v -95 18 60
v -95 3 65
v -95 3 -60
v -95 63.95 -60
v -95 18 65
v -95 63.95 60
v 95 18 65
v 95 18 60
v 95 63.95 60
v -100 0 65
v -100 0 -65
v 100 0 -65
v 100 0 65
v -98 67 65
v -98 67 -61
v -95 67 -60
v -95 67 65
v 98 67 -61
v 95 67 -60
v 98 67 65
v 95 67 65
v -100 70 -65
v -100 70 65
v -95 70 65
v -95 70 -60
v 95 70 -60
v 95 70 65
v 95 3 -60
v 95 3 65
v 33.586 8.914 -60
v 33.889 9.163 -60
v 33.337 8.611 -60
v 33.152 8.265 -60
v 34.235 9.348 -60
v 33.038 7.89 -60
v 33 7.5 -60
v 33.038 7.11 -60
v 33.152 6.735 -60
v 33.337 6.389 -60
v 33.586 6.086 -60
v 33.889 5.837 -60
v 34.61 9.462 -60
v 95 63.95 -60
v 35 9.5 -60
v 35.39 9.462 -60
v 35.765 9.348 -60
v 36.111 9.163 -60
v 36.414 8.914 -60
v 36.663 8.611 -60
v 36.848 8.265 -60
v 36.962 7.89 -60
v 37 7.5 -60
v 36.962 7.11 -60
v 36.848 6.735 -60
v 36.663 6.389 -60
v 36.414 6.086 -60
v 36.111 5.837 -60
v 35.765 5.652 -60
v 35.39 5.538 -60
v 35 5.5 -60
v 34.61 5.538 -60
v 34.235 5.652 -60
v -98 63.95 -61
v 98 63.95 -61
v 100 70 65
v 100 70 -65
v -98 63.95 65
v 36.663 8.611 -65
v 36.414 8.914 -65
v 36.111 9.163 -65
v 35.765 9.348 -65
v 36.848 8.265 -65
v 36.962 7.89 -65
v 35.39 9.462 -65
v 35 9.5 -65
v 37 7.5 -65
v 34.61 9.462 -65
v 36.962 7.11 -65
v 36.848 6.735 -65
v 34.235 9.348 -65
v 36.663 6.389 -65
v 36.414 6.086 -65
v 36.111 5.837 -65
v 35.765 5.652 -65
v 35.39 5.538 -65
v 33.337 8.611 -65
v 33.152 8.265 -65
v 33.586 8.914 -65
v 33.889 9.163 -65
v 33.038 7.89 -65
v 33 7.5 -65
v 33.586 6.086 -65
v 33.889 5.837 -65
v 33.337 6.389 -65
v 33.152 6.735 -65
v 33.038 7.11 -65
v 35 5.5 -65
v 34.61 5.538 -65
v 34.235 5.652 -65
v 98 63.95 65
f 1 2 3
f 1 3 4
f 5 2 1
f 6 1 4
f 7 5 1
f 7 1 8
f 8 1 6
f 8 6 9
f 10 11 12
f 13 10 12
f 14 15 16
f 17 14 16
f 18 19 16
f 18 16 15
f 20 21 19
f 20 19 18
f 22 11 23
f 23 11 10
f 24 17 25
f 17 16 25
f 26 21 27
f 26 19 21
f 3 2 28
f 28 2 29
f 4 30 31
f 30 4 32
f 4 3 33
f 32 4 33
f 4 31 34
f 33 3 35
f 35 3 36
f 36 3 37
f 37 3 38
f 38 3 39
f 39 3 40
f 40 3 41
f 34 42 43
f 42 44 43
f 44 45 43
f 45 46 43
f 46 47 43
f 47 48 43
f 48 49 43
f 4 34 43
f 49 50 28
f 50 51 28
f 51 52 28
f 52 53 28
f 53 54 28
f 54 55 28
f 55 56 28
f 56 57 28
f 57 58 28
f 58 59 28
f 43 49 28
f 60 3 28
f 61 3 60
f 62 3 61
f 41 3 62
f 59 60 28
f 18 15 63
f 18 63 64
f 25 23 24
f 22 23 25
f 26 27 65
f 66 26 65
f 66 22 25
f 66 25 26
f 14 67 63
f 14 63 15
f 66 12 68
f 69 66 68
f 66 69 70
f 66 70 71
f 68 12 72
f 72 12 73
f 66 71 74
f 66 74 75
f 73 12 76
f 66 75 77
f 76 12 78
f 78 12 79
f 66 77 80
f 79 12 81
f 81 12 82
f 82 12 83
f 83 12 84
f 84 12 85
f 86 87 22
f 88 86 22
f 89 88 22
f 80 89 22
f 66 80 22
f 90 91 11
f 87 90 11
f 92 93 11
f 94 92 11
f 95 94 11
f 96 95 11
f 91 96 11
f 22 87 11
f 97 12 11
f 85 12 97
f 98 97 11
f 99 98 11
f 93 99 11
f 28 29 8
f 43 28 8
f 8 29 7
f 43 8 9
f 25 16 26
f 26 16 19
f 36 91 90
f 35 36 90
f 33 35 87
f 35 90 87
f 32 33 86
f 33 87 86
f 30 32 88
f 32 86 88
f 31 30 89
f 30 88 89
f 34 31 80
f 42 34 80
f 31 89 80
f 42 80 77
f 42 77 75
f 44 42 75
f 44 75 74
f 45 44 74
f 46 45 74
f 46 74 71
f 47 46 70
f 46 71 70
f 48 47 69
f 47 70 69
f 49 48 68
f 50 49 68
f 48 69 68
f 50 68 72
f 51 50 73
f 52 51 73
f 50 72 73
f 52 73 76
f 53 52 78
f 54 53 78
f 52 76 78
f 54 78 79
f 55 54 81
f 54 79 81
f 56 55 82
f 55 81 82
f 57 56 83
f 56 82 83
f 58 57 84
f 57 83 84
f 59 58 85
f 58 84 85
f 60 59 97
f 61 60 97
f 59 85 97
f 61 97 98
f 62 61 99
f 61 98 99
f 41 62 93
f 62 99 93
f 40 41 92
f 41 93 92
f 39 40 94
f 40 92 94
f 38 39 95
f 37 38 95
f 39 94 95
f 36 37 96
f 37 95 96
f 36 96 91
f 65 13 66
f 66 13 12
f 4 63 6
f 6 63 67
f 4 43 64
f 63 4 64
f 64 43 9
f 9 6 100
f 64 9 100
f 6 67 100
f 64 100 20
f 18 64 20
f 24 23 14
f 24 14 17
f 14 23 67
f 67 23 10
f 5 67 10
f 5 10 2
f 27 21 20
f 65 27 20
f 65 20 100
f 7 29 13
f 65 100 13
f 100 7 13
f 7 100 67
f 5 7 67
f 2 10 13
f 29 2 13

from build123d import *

# Parameters (mm, degrees)
CROQUIS1_W              = 200
CROQUIS1_H              = 130
SALIENTE_EXTRUIR1_DEPTH = 3
CROQUIS2_W              = 5
CROQUIS2_H              = 5
CROQUIS2_H_2            = 120
CROQUIS2_W_2            = 190
SALIENTE_EXTRUIR2_DEPTH = 67
CROQUIS3_W              = 190
CROQUIS3_H              = 15
CORTAR_EXTRUIR1_DEPTH   = 5
CROQUIS4_W              = 196
CROQUIS4_H              = 3.05
CORTAR_EXTRUIR2_DEPTH   = 126
CROQUIS7_W              = 190
CROQUIS7_H              = 3
CORTAR_EXTRUIR3_DEPTH   = 5
CROQUIS8_R              = 2
CORTAR_EXTRUIR4_DEPTH   = 5


with BuildPart() as part:
    # Croquis1 → Saliente-Extruir1 (new body)
    with BuildSketch(Plane(origin=(0, 0, 0), x_dir=(1, 0, 0), z_dir=(0, 1, 0))):
        Rectangle(CROQUIS1_W, CROQUIS1_H)
    extrude(amount=SALIENTE_EXTRUIR1_DEPTH)

    # Croquis2 → Saliente-Extruir2 (add)
    with BuildSketch(Plane(origin=(0, 3, 0), x_dir=(1, 0, 0), z_dir=(0, 1, 0))):
        with Locations((-97.5, 62.5)):
            Rectangle(CROQUIS2_W, CROQUIS2_H)
        with Locations((-97.5, 0)):
            Rectangle(CROQUIS2_W, CROQUIS2_H_2)
        with Locations((0, 62.5)):
            Rectangle(CROQUIS2_W_2, CROQUIS2_H)
        with Locations((97.5, 62.5)):
            Rectangle(CROQUIS2_W, CROQUIS2_H)
        with Locations((-97.5, -62.5)):
            Rectangle(CROQUIS2_W, CROQUIS2_H)
        with Locations((97.5, 0)):
            Rectangle(CROQUIS2_W, CROQUIS2_H_2)
        with Locations((0, -62.5)):
            Rectangle(CROQUIS2_W_2, CROQUIS2_H)
        with Locations((97.5, -62.5)):
            Rectangle(CROQUIS2_W, CROQUIS2_H)
    extrude(amount=SALIENTE_EXTRUIR2_DEPTH)

    # Croquis3 → Cortar-Extruir1 (cut)
    with BuildSketch(Plane.XY.offset(65)):
        with Locations((0, 10.5)):
            Rectangle(CROQUIS3_W, CROQUIS3_H)
    extrude(amount=-CORTAR_EXTRUIR1_DEPTH, mode=Mode.SUBTRACT)

    # Croquis4 → Cortar-Extruir2 (cut)
    with BuildSketch(Plane.XY.offset(65)):
        with Locations((0, 65.475)):
            Rectangle(CROQUIS4_W, CROQUIS4_H)
    extrude(amount=-CORTAR_EXTRUIR2_DEPTH, mode=Mode.SUBTRACT)

    # Croquis7 → Cortar-Extruir3 (cut)
    with BuildSketch(Plane(origin=(0, 0, 60), x_dir=(-1, 0, 0), z_dir=(0, 0, -1))):
        with Locations((0, 68.5)):
            Rectangle(CROQUIS7_W, CROQUIS7_H)
    extrude(amount=-CORTAR_EXTRUIR3_DEPTH, mode=Mode.SUBTRACT)

    # Croquis8 → Cortar-Extruir4 (cut)
    with BuildSketch(Plane(origin=(0, 0, -65), x_dir=(-1, 0, 0), z_dir=(0, 0, -1))):
        with Locations((-35, 7.5)):
            Circle(CROQUIS8_R)
    extrude(amount=-CORTAR_EXTRUIR4_DEPTH, mode=Mode.SUBTRACT)


solid = part.part
